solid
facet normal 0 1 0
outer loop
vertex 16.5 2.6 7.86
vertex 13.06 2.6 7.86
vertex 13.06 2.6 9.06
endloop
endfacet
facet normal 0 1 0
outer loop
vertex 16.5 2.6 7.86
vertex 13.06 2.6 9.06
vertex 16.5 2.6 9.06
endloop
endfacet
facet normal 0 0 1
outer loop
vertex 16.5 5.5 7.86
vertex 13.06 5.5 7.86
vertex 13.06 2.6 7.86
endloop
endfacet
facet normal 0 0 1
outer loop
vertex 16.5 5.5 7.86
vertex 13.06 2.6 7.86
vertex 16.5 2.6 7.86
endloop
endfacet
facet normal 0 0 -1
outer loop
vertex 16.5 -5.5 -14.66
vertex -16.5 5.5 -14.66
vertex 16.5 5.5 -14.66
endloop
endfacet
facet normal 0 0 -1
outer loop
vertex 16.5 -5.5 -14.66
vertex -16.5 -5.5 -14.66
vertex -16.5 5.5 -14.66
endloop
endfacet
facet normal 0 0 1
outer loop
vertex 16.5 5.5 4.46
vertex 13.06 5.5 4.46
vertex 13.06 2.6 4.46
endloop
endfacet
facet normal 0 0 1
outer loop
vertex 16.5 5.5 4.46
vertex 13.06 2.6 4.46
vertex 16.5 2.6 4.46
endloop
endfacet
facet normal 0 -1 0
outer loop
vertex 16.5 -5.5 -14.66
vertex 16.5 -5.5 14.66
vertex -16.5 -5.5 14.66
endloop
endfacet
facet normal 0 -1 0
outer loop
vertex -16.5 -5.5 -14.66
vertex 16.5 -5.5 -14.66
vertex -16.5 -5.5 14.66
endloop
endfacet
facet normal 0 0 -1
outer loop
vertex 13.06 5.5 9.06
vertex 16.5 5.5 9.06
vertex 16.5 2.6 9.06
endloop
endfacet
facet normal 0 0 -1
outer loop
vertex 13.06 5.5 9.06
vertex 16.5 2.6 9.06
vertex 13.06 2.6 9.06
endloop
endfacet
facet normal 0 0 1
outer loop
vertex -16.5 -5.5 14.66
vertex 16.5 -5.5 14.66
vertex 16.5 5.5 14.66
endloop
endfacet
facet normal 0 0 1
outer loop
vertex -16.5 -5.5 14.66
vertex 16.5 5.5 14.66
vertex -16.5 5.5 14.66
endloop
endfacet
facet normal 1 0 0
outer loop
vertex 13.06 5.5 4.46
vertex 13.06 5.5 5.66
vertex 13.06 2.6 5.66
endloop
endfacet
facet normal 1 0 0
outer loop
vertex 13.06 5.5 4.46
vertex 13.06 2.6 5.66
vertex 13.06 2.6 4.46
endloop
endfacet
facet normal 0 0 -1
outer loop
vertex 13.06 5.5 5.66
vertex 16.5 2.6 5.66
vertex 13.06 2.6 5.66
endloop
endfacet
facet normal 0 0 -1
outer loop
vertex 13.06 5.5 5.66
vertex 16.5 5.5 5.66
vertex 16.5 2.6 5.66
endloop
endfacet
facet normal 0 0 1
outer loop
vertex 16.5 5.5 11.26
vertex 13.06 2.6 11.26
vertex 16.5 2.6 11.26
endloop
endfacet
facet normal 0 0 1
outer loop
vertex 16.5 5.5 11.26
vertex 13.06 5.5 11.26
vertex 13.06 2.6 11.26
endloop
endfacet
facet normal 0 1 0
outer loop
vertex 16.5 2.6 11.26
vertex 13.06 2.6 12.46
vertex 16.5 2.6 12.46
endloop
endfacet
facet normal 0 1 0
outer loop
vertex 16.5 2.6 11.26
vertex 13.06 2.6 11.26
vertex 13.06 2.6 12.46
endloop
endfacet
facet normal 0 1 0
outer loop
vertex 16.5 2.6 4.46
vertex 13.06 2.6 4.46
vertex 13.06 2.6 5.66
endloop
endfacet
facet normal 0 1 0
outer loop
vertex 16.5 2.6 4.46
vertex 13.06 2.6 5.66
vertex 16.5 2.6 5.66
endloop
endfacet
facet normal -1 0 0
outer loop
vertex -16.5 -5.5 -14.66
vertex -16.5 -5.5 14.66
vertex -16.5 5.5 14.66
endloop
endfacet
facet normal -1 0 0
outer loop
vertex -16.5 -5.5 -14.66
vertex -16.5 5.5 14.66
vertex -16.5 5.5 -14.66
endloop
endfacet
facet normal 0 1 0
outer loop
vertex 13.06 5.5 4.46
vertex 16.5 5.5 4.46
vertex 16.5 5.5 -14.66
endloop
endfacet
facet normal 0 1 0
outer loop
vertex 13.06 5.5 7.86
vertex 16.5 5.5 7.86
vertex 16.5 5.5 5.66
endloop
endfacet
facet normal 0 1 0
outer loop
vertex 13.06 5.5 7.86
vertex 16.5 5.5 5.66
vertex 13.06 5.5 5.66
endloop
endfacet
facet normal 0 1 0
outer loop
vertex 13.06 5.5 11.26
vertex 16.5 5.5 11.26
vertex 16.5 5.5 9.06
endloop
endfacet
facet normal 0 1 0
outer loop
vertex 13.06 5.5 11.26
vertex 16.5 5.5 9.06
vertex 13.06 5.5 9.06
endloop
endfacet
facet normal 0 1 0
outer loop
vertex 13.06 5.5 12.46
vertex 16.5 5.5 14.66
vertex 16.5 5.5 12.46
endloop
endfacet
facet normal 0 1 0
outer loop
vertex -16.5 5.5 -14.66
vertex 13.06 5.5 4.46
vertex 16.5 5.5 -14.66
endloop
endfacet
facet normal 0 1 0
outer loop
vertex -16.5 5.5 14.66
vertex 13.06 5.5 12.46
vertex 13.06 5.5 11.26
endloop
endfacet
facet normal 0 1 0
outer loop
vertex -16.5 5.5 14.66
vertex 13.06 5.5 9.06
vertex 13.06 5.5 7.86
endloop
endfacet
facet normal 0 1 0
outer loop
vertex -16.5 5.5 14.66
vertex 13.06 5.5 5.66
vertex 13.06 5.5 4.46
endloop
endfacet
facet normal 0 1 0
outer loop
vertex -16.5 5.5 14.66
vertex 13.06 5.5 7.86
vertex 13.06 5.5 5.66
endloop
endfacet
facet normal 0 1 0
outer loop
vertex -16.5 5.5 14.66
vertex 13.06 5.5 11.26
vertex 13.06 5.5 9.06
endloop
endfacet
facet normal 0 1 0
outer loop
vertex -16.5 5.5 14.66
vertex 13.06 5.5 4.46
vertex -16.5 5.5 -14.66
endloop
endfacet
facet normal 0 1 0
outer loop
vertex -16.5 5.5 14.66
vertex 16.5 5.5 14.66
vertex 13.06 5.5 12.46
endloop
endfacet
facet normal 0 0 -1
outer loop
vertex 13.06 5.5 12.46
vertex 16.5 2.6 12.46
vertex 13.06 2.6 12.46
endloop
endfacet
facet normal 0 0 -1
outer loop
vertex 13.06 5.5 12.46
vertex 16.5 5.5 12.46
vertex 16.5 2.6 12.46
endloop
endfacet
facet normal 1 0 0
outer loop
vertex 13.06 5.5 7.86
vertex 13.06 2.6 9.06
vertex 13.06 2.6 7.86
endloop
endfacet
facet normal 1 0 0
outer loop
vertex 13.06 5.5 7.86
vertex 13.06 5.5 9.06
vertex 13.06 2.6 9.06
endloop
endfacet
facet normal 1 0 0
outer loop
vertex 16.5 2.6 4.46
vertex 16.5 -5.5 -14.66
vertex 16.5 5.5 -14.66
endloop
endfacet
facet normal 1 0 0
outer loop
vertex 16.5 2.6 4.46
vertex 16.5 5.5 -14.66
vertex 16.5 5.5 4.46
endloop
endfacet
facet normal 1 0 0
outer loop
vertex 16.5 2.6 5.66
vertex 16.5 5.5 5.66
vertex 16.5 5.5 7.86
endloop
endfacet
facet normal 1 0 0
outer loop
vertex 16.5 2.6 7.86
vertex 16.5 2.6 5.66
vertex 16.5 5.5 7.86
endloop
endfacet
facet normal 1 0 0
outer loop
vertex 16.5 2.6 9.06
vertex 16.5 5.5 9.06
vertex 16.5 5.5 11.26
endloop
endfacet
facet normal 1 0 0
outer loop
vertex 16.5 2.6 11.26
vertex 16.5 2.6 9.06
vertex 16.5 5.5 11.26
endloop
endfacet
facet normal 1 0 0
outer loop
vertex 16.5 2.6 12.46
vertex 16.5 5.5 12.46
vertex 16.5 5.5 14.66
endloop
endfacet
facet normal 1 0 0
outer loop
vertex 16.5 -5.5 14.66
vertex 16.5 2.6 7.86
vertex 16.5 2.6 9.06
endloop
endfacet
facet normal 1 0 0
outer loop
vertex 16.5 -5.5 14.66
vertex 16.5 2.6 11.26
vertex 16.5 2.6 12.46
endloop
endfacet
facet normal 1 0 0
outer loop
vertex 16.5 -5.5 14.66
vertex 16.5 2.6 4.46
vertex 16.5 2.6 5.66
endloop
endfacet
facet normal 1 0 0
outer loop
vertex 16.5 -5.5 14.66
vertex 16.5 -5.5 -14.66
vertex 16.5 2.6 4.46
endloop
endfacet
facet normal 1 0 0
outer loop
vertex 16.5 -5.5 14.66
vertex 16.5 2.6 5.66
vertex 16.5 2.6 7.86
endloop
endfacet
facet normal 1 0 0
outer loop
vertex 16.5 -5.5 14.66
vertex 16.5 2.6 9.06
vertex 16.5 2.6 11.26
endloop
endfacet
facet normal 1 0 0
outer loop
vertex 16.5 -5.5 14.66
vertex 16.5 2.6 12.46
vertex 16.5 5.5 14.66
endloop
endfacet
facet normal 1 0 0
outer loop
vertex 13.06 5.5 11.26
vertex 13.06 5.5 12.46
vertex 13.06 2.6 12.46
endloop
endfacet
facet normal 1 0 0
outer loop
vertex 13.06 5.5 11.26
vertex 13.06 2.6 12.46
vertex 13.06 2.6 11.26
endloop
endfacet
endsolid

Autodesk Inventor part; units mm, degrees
ref_plane "YZ Plane" through (0, 0, 0) normal (1, 0, 0) x (0, 1, 0)
ref_plane "XZ Plane" through (0, 0, 0) normal (0, 1, 0) x (-1, 0, 0)
ref_plane "XY Plane" through (0, 0, 0) normal (0, 0, 1) x (1, 0, 0)
sketch "草圖1" plane through (0, 0, 0) normal (0, 1, 0) x (-1, 0, 0)
  line L0 (-16.5, 14.66) -> (16.5, 14.66)
  line L1 (16.5, 14.66) -> (16.5, -14.66)
  line L2 (16.5, -14.66) -> (-16.5, -14.66)
  line L3 (-16.5, -14.66) -> (-16.5, 14.66)
  line L4 (-16.5, 14.66) -> (16.5, -14.66) construction
  line L5 (16.5, 14.66) -> (-16.5, -14.66) construction
  point P0 (0, 0)
  dimension "d0" = 29.32
  dimension "d1" = 33
extrude "擠出1" add sketch "草圖1" along normal mid plane 11
sketch "草圖2" plane through (0, 5.5, 0) normal (0, 1, 0) x (1, 0, 0)
  line L0 (16.5, -14.66) -> (16.5, 14.66) projected
  line L1 (16.5, -12.46) -> (13.06, -12.46)
  line L2 (13.06, -12.46) -> (13.06, -11.26)
  line L3 (13.06, -11.26) -> (16.5, -11.26)
  line L4 (16.5, -11.26) -> (16.5, -12.46)
  line L5 (-16.5, -14.66) -> (16.5, -14.66) projected
  line L6 (16.5, -9.06) -> (13.06, -9.06)
  line L7 (13.06, -9.06) -> (13.06, -7.86)
  line L8 (13.06, -7.86) -> (16.5, -7.86)
  line L9 (16.5, -7.86) -> (16.5, -9.06)
  line L10 (16.5, -5.66) -> (13.06, -5.66)
  line L11 (13.06, -5.66) -> (13.06, -4.46)
  line L12 (13.06, -4.46) -> (16.5, -4.46)
  line L13 (16.5, -4.46) -> (16.5, -5.66)
  point P0 (0, 0)
  point P1 (16.5, -5.66)
  point P2 (16.5, -4.46)
  dimension "d4" = 1.2
  dimension "d5" = 3.44
  dimension "d6" = 2.2
  dimension "d9" = 3.4
extrude "擠出2" cut sketch "草圖2" against normal blind 2.9
properties part number "S009_3.7V_Li-ion_Battery_900mAh_3.33Wh"
